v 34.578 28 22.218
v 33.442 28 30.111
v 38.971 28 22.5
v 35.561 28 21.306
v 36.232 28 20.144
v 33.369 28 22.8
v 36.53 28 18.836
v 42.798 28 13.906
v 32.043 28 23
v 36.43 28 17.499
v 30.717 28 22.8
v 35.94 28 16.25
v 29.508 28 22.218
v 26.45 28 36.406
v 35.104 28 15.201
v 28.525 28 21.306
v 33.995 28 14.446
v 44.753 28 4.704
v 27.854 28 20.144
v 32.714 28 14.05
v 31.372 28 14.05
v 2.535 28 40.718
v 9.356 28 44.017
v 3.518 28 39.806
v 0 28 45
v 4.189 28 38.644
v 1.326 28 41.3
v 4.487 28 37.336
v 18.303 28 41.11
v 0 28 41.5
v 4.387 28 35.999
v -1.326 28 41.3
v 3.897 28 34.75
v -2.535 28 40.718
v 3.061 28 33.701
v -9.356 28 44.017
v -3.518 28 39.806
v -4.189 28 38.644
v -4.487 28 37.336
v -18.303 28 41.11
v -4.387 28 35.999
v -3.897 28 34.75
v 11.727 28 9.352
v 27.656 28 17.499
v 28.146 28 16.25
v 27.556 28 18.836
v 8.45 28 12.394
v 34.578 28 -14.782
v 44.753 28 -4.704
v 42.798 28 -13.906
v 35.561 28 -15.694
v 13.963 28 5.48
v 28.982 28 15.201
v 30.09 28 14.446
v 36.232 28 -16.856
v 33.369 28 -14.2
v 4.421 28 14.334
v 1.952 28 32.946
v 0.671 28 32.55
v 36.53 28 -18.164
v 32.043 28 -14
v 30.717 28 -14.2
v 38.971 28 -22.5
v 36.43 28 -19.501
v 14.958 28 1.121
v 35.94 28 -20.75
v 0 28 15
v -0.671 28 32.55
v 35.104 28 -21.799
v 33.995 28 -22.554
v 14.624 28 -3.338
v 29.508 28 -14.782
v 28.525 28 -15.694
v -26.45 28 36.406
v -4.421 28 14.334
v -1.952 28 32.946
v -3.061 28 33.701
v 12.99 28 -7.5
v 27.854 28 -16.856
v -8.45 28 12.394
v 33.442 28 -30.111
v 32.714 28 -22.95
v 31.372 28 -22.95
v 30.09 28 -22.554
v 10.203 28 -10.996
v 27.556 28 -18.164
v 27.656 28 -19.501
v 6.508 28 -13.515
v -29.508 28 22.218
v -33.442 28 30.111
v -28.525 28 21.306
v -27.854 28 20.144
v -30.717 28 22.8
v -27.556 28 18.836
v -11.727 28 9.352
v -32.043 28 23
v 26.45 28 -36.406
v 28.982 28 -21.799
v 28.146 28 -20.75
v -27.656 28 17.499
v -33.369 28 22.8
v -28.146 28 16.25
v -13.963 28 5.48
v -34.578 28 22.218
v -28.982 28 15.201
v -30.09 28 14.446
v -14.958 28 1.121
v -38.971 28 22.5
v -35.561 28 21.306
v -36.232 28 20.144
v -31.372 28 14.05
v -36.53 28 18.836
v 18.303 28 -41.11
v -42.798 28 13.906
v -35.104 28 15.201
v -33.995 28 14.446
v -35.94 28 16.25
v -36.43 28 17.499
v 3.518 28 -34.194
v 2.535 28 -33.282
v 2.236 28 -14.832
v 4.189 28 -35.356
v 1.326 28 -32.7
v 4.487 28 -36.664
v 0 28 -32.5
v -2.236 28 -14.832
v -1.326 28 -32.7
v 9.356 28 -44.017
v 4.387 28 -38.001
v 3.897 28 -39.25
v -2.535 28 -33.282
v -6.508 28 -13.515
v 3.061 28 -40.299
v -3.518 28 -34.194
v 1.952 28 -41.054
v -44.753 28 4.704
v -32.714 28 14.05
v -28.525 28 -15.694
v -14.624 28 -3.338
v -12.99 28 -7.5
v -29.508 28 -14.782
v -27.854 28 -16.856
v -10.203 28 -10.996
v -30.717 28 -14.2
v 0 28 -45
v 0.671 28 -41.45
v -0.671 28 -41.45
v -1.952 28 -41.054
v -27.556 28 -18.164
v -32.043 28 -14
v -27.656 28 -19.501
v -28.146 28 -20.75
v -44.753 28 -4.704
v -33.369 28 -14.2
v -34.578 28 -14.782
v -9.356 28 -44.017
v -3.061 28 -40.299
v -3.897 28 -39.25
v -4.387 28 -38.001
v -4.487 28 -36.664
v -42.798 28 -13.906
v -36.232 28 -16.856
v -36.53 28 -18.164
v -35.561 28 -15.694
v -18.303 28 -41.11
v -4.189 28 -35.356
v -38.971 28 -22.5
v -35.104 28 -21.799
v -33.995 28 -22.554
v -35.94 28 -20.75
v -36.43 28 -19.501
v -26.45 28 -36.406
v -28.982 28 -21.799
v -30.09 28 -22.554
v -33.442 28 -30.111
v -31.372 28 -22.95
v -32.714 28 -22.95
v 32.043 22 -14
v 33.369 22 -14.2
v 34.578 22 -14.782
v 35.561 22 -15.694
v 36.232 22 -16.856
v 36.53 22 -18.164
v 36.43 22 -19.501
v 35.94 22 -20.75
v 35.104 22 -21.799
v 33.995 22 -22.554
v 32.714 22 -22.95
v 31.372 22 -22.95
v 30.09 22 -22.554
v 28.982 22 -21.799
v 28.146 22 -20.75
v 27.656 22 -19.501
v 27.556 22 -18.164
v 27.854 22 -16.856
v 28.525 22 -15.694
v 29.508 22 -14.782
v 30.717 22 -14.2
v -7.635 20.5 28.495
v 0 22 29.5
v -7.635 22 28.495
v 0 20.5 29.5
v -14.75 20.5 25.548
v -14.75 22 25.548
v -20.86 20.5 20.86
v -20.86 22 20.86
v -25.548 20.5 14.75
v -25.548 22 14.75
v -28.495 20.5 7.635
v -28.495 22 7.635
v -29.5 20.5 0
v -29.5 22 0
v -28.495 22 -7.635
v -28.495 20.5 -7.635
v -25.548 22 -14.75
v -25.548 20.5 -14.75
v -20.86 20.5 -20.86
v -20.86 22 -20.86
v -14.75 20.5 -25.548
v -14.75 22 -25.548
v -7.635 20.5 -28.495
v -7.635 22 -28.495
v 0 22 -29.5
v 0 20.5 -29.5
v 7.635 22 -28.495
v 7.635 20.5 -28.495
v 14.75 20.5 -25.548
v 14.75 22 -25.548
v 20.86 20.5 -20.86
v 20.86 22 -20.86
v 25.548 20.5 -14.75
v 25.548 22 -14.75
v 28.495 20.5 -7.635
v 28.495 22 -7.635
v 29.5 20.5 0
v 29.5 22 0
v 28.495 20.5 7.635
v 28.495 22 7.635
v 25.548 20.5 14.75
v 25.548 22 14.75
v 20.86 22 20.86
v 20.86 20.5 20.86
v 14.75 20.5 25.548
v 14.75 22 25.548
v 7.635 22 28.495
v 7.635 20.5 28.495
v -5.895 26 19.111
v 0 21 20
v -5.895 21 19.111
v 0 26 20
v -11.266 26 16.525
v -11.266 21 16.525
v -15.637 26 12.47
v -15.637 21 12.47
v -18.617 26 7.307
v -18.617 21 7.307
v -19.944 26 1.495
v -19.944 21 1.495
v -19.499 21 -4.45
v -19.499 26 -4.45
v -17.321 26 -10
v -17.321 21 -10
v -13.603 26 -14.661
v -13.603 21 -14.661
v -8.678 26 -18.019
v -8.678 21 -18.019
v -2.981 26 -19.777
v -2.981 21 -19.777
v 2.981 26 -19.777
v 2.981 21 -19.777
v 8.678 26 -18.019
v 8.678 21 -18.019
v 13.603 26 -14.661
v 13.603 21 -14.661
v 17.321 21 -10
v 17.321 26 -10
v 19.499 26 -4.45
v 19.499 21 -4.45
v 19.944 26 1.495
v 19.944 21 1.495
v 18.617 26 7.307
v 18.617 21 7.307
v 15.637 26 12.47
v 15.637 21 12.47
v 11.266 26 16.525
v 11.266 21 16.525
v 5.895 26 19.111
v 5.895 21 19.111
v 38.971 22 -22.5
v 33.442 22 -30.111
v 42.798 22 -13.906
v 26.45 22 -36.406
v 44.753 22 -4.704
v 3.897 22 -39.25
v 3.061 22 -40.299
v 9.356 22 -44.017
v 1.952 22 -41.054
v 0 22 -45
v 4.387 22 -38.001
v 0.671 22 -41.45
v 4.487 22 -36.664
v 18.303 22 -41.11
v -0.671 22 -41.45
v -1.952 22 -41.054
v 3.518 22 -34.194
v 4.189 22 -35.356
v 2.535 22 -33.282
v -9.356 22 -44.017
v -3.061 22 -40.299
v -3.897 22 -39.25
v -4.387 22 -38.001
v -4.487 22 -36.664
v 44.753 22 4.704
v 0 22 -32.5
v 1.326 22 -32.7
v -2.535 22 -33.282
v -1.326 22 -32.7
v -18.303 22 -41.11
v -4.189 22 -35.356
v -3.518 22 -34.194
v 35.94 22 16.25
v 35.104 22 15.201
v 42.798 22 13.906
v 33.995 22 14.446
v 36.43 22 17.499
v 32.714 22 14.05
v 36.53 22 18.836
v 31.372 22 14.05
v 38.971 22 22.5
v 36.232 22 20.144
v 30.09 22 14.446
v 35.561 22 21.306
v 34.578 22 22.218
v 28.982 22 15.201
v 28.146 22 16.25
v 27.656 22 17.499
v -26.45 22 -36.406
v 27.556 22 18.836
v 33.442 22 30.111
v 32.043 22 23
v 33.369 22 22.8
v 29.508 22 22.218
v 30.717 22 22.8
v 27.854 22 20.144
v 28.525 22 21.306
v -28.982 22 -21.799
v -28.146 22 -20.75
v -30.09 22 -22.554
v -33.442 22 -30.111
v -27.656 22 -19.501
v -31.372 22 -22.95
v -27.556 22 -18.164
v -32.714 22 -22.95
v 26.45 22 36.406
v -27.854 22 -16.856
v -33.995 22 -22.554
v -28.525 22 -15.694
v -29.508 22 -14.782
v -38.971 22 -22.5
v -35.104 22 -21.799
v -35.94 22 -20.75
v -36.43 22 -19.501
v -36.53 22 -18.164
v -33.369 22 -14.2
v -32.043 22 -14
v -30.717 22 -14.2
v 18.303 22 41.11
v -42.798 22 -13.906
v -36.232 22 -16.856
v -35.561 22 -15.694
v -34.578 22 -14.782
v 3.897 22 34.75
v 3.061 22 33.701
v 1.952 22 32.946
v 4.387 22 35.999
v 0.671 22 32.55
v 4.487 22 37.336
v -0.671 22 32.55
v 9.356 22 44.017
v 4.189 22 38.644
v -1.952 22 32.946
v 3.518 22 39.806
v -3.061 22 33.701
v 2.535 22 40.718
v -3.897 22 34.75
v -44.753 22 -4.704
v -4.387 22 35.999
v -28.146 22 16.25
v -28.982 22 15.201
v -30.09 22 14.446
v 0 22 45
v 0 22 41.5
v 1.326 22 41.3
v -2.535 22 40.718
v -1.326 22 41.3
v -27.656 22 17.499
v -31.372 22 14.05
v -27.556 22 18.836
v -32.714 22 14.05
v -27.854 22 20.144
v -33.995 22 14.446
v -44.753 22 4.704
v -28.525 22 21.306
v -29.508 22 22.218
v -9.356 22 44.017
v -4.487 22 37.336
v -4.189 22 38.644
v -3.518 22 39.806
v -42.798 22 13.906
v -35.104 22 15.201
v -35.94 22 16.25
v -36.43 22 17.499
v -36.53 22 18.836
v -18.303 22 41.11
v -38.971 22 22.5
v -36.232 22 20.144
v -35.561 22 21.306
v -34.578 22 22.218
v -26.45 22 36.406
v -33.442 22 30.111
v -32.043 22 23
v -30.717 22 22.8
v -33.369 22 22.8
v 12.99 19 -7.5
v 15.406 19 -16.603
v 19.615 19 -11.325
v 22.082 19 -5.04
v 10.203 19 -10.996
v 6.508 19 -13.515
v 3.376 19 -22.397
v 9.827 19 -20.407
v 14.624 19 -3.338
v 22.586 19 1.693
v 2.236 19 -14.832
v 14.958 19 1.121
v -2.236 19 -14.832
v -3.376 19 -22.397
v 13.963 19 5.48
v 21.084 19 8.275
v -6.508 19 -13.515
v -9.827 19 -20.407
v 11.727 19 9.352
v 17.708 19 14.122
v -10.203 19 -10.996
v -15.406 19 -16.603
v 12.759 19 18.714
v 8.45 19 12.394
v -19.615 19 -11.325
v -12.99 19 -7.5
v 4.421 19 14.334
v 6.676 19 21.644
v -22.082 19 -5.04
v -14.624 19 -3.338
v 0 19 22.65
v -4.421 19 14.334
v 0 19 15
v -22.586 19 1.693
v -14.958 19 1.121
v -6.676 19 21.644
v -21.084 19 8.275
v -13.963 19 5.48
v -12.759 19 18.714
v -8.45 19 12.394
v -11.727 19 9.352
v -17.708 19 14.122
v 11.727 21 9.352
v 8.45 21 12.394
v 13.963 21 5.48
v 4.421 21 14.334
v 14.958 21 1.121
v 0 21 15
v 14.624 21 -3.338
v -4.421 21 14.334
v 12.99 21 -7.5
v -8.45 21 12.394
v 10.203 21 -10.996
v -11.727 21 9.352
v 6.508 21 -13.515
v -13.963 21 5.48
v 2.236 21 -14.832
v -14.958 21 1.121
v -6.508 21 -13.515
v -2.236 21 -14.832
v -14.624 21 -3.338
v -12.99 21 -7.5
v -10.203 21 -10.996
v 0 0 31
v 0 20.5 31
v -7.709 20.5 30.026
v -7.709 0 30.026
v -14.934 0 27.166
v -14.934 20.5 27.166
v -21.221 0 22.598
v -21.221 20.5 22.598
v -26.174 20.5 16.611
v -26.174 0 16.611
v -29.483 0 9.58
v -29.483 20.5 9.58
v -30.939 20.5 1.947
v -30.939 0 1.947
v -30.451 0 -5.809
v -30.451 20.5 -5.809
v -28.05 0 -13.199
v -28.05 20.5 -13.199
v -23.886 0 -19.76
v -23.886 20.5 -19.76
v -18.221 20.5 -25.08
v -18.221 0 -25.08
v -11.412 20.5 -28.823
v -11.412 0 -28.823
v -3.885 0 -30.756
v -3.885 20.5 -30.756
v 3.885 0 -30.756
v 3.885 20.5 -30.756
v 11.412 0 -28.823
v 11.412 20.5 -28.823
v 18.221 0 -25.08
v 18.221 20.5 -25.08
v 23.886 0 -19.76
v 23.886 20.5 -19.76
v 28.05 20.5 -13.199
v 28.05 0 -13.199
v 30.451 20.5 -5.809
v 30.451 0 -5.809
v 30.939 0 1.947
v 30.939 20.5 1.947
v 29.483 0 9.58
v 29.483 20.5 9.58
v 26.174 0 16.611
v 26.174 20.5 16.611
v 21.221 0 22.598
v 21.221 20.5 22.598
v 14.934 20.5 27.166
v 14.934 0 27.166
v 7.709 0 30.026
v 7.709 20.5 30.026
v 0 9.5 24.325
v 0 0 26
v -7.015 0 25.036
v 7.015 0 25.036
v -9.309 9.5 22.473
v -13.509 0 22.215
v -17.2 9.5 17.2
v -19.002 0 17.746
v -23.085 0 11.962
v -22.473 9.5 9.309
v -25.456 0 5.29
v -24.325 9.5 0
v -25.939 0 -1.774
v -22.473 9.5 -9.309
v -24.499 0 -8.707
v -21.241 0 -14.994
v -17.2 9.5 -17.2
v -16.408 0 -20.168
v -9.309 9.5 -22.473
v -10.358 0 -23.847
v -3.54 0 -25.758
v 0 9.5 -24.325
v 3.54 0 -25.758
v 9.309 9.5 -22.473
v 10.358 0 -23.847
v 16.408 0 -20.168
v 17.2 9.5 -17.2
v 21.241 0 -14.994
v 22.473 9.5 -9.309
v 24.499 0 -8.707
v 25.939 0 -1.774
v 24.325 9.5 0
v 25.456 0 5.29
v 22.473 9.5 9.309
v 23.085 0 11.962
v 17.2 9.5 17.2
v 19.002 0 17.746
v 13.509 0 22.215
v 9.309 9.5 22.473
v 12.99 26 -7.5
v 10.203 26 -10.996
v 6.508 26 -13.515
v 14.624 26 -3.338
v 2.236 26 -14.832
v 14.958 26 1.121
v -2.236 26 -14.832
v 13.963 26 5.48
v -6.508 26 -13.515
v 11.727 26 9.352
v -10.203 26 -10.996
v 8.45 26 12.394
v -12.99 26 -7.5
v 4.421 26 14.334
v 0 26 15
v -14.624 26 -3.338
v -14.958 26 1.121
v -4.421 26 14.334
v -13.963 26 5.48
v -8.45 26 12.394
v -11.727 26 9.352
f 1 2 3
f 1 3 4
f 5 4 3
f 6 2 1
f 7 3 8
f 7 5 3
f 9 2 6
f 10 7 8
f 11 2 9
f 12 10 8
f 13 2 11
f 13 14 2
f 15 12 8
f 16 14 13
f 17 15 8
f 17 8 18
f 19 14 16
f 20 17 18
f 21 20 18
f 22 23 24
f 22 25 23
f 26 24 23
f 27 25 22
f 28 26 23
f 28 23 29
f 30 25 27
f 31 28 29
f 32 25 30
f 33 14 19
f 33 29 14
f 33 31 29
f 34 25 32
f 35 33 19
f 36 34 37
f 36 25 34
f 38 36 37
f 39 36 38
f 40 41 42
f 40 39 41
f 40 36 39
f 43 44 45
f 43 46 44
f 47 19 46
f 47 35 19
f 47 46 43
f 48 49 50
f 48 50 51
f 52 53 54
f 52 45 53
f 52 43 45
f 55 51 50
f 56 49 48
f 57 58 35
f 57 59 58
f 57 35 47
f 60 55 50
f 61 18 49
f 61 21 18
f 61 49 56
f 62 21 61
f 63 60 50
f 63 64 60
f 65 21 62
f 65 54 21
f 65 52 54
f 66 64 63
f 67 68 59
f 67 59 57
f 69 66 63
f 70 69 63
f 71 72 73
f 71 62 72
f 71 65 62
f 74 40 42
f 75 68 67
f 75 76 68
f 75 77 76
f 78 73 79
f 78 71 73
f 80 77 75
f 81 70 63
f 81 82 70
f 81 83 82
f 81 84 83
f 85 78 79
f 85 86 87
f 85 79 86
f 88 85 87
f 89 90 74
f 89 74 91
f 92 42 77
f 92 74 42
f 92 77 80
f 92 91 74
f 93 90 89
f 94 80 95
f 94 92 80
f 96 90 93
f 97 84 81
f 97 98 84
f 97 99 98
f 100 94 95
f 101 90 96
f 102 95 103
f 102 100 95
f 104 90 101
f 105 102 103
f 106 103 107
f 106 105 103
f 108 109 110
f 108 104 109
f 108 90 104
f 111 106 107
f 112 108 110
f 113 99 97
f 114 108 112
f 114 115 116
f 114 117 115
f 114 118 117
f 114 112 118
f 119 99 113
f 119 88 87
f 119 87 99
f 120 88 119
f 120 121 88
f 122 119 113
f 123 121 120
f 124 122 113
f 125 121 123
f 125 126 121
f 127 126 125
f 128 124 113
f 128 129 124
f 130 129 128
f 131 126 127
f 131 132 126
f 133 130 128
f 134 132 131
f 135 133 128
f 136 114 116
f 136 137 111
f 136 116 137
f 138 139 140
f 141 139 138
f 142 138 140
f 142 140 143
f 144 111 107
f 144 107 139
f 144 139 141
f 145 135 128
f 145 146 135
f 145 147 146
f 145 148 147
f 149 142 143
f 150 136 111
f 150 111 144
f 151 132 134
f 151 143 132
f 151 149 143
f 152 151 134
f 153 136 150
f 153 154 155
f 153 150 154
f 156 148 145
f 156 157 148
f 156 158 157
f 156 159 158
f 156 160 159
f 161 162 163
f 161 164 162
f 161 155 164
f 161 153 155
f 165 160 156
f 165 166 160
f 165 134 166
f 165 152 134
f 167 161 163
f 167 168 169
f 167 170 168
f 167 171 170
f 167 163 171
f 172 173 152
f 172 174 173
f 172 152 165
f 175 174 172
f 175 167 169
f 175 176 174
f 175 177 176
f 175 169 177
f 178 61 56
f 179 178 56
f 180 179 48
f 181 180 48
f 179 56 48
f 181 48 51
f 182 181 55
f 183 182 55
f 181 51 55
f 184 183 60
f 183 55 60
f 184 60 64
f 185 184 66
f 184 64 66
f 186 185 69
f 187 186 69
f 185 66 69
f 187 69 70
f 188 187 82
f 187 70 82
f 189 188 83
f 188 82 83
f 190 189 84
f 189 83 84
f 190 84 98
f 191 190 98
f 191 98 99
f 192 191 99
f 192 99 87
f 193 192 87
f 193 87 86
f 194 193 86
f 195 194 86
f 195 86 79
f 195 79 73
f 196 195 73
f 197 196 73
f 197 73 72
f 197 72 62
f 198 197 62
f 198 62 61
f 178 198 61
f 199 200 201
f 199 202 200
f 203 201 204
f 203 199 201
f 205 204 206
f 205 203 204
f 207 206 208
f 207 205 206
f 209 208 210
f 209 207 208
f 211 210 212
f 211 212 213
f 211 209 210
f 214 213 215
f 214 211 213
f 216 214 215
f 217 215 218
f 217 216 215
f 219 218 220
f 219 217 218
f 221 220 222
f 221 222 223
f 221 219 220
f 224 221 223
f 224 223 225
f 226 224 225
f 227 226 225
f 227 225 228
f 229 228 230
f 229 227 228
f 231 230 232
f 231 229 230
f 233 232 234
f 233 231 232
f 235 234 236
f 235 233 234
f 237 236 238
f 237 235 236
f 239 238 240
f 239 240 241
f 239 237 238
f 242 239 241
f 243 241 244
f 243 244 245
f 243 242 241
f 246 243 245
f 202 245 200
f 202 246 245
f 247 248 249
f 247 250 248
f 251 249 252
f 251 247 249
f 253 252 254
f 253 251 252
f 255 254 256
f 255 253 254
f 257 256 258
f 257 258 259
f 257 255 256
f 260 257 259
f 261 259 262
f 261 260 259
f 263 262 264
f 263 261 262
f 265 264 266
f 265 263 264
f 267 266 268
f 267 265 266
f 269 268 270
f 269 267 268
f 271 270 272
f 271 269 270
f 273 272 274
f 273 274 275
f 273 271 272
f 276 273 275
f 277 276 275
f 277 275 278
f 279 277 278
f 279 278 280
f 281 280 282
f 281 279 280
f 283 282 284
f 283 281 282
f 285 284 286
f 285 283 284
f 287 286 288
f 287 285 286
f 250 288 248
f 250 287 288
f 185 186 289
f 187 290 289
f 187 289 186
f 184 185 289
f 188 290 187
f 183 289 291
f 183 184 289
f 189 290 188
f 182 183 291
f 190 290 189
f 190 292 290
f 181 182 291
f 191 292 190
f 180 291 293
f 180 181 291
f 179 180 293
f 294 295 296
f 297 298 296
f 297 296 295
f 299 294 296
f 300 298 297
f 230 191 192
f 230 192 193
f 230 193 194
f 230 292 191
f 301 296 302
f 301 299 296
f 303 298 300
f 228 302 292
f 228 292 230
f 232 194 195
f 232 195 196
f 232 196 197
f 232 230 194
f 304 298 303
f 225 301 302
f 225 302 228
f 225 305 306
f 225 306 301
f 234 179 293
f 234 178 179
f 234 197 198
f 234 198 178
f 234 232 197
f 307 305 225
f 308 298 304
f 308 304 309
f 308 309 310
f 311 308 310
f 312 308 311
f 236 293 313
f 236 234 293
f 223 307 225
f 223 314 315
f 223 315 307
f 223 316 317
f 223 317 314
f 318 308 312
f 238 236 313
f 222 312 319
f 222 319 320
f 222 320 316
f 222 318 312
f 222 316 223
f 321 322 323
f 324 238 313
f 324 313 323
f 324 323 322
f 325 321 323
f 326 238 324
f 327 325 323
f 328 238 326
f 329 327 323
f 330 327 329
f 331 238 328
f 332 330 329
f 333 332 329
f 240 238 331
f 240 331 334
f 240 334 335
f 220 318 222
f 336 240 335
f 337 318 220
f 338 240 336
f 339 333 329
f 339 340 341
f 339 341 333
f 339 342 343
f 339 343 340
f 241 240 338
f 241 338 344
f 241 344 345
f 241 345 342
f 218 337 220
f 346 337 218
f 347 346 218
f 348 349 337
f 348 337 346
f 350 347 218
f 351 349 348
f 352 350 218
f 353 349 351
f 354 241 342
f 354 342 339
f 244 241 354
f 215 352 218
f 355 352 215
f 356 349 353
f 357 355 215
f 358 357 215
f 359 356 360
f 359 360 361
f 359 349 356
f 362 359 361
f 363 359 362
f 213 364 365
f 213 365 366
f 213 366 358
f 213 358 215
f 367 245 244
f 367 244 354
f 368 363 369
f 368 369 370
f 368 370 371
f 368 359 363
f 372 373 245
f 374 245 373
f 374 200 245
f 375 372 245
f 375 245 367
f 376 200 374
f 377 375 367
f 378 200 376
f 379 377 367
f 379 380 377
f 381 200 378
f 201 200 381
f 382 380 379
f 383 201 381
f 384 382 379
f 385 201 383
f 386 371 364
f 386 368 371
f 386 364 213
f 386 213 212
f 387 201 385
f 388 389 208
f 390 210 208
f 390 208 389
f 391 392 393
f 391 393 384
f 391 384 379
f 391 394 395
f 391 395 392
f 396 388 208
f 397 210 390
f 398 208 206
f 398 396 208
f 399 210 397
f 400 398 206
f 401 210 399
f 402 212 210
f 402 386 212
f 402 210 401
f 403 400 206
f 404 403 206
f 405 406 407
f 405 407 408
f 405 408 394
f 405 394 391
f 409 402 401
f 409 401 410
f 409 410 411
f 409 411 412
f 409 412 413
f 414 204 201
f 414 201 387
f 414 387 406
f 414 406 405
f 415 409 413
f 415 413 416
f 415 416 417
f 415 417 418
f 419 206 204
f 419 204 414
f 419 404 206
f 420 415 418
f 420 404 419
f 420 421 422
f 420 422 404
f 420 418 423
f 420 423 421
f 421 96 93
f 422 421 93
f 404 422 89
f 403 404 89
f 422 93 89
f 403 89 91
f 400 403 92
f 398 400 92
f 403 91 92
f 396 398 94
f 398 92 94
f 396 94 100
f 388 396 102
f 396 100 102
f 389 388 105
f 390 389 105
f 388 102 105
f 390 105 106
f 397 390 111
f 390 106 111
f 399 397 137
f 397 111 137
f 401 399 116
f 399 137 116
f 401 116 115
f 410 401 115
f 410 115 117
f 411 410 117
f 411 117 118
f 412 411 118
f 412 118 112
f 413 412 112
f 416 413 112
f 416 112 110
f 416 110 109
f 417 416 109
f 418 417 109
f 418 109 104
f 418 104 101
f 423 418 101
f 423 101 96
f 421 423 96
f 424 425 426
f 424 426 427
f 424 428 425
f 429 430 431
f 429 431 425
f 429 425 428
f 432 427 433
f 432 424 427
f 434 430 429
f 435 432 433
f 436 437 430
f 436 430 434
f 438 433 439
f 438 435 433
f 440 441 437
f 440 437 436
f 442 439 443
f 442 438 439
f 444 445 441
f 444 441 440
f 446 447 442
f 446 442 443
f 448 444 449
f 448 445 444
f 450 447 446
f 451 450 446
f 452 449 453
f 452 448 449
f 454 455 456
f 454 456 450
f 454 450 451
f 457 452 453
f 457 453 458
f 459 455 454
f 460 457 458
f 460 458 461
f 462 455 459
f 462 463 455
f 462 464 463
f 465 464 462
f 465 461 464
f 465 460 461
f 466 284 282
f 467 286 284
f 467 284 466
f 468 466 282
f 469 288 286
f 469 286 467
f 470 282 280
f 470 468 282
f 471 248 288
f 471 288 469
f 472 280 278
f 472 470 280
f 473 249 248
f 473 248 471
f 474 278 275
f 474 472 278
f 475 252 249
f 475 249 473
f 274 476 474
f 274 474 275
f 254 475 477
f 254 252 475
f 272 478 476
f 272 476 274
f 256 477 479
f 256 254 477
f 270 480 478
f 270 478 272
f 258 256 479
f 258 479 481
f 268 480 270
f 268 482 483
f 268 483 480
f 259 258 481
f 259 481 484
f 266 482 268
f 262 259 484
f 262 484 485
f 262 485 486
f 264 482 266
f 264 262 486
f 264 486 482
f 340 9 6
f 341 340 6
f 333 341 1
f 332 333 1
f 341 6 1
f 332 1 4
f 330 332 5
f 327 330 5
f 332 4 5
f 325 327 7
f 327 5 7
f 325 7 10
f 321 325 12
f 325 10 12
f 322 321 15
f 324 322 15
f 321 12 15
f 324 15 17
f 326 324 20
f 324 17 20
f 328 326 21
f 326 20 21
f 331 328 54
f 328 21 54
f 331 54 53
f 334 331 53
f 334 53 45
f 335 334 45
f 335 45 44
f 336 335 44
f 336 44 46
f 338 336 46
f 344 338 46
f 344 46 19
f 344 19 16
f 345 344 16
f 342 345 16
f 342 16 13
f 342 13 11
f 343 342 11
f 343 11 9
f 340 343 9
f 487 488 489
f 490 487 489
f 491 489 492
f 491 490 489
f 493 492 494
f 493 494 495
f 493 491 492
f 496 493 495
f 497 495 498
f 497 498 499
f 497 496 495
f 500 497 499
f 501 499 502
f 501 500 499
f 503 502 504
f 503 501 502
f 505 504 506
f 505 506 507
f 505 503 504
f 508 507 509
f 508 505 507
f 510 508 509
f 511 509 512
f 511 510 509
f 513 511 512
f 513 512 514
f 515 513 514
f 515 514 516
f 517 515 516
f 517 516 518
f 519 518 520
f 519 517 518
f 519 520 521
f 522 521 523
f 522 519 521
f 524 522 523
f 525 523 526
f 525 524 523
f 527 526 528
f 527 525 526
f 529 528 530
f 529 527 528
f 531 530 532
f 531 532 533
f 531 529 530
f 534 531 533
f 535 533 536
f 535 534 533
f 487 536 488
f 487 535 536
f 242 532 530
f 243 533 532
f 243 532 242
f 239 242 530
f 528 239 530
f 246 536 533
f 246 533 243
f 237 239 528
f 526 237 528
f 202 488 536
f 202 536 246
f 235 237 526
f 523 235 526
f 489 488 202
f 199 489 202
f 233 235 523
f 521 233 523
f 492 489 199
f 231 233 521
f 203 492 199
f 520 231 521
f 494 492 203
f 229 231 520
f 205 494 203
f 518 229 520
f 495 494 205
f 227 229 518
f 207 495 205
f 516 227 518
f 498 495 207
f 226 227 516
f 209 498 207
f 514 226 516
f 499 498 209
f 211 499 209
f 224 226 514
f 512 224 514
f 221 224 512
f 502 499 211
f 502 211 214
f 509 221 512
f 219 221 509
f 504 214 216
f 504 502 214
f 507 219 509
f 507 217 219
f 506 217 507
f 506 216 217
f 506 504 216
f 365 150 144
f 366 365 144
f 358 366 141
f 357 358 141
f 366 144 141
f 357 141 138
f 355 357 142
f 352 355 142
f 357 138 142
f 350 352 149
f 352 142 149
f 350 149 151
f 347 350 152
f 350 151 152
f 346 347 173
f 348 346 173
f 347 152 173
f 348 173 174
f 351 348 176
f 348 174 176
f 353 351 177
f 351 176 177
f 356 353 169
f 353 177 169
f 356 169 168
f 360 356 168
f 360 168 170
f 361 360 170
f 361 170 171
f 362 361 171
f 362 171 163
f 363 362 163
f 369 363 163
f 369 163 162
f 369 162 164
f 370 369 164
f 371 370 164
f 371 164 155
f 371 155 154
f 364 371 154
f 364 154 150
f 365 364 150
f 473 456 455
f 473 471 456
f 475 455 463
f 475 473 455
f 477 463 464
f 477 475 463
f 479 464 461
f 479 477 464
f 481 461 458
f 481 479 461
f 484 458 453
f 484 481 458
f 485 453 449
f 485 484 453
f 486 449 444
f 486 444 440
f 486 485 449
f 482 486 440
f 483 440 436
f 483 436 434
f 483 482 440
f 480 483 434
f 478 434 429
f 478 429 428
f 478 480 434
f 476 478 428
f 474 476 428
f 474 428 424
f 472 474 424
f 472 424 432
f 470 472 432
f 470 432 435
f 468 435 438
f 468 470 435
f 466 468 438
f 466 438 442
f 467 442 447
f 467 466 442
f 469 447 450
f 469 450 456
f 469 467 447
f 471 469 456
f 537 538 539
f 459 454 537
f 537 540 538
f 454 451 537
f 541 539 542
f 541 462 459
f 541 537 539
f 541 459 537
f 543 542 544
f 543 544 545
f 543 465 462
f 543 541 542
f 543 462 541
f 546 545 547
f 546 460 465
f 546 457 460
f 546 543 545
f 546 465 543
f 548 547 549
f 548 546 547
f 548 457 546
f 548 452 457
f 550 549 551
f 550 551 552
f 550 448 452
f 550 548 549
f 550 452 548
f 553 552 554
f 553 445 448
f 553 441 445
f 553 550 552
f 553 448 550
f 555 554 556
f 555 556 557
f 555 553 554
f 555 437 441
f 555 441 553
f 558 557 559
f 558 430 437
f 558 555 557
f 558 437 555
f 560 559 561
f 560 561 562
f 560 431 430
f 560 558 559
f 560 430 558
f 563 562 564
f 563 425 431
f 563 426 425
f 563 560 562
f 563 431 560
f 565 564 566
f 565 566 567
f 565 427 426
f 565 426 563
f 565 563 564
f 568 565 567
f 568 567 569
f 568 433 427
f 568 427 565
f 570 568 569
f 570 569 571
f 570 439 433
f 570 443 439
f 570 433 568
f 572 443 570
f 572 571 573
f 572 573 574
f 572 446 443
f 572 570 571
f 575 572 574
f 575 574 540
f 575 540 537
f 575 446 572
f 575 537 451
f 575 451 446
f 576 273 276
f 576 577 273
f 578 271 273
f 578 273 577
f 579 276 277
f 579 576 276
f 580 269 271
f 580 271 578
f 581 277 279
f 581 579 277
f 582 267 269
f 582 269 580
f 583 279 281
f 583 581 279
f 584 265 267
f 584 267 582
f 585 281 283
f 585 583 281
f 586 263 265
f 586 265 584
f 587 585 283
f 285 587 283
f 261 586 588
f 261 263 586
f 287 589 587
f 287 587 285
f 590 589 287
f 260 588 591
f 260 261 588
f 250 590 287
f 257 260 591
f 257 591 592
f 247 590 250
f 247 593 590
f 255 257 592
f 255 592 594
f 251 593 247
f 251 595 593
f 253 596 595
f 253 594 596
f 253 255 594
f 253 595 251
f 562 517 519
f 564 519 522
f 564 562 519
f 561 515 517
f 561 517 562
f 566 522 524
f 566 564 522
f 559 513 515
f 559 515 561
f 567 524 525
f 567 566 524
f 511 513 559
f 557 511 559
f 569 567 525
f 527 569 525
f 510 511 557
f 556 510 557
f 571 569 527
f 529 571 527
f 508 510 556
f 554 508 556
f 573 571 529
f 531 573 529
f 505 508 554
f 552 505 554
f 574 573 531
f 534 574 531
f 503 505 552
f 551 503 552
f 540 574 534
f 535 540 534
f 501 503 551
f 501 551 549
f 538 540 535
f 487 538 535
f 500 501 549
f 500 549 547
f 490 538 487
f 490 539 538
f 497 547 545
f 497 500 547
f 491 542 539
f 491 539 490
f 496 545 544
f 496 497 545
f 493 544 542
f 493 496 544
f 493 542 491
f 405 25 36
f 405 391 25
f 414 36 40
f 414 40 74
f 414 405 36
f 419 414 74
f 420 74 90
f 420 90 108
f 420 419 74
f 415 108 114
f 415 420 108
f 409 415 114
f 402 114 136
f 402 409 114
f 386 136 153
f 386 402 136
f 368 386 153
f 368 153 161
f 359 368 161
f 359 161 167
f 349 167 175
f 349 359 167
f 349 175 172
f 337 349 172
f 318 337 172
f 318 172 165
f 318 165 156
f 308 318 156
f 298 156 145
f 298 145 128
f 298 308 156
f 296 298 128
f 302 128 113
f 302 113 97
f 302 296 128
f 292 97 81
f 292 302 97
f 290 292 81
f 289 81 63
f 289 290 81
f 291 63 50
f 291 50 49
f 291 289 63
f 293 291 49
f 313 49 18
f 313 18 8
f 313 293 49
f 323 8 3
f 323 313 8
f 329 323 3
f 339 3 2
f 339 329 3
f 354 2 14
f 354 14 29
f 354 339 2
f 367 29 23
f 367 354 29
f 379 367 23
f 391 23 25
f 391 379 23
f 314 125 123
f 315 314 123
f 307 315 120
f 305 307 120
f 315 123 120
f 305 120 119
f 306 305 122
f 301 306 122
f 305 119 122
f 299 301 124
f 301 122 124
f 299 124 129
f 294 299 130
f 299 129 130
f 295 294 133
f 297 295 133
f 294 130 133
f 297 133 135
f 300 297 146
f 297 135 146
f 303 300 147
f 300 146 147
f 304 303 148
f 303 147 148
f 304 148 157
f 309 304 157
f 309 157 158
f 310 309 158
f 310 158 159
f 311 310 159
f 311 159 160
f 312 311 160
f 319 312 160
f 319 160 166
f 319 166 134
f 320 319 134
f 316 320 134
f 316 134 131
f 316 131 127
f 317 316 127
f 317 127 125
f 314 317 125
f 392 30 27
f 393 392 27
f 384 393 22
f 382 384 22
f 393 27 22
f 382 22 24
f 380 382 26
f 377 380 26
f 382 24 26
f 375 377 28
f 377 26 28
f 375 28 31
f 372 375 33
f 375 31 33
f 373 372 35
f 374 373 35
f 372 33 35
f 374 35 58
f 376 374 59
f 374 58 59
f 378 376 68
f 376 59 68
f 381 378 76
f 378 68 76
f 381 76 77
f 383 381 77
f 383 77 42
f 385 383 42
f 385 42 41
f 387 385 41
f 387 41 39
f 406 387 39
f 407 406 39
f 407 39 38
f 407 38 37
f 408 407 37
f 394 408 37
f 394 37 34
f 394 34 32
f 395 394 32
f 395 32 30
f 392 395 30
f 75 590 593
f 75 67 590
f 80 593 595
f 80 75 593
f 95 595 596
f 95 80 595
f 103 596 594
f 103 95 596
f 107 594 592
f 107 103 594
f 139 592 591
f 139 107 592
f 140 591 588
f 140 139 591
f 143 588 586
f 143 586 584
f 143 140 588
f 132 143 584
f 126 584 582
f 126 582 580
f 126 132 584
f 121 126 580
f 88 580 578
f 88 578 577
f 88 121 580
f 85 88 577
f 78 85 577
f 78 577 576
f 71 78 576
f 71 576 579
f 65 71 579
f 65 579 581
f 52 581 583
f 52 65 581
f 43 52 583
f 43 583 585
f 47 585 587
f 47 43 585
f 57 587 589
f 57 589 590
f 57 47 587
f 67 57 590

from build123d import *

# Parameters (mm, degrees)
CUT_EXTRUDE1_REACH = 71.527
SKETCH2_R          = 4.5


with BuildPart() as part:
    # Sketch1 → Revolve1 (revolve)
    with BuildSketch(Plane.XY, mode=Mode.PRIVATE) as revolve1_sk:
        Polygon((-45, 28), (-45, 22), (-29.5, 22), (-29.5, 20.5), (-31, 20.5), (-31, 0), (-26, 0), (-22.649787367, 19), (-15, 19), (-15, 21), (-20, 21), (-20, 26), (-15, 26), (-15, 28), (-29, 28), align=None)
    revolve(revolve1_sk.sketch.rotate(Axis((0, 30.618797564, 0), (0, -1, 0)), 270), axis=Axis((0, 30.618797564, 0), (0, -1, 0)))

    # Sketch2 → Cut-Extrude1 (cut, up to next)
    with BuildSketch(Plane(origin=(0, 28, 0), x_dir=(1, 0, 0), z_dir=(0, 1, 0)), mode=Mode.PRIVATE) as cut_extrude1_sk1:
        with Locations(Location((0, 37, 0), (0, 0, 270))):
            Circle(SKETCH2_R)
    cut_extrude1_tool1 = extrude(cut_extrude1_sk1.sketch, amount=-CUT_EXTRUDE1_REACH, mode=Mode.PRIVATE) & part.part
    # Sketch2 → Cut-Extrude1 (cut, up to next)
    with BuildSketch(Plane(origin=(0, 28, 0), x_dir=(1, 0, 0), z_dir=(0, 1, 0)), mode=Mode.PRIVATE) as cut_extrude1_sk2:
        with Locations(Location((32.04293994, 18.5, 0), (0, 0, 270))):
            Circle(SKETCH2_R)
    cut_extrude1_tool2 = extrude(cut_extrude1_sk2.sketch, amount=-CUT_EXTRUDE1_REACH, mode=Mode.PRIVATE) & part.part
    # Sketch2 → Cut-Extrude1 (cut, up to next)
    with BuildSketch(Plane(origin=(0, 28, 0), x_dir=(1, 0, 0), z_dir=(0, 1, 0)), mode=Mode.PRIVATE) as cut_extrude1_sk3:
        with Locations(Location((32.04293994, -18.5, 0), (0, 0, 270))):
            Circle(SKETCH2_R)
    cut_extrude1_tool3 = extrude(cut_extrude1_sk3.sketch, amount=-CUT_EXTRUDE1_REACH, mode=Mode.PRIVATE) & part.part
    # Sketch2 → Cut-Extrude1 (cut, up to next)
    with BuildSketch(Plane(origin=(0, 28, 0), x_dir=(1, 0, 0), z_dir=(0, 1, 0)), mode=Mode.PRIVATE) as cut_extrude1_sk4:
        with Locations(Location((0, -37, 0), (0, 0, 270))):
            Circle(SKETCH2_R)
    cut_extrude1_tool4 = extrude(cut_extrude1_sk4.sketch, amount=-CUT_EXTRUDE1_REACH, mode=Mode.PRIVATE) & part.part
    # Sketch2 → Cut-Extrude1 (cut, up to next)
    with BuildSketch(Plane(origin=(0, 28, 0), x_dir=(1, 0, 0), z_dir=(0, 1, 0)), mode=Mode.PRIVATE) as cut_extrude1_sk5:
        with Locations(Location((-32.04293994, -18.5, 0), (0, 0, 270))):
            Circle(SKETCH2_R)
    cut_extrude1_tool5 = extrude(cut_extrude1_sk5.sketch, amount=-CUT_EXTRUDE1_REACH, mode=Mode.PRIVATE) & part.part
    # Sketch2 → Cut-Extrude1 (cut, up to next)
    with BuildSketch(Plane(origin=(0, 28, 0), x_dir=(1, 0, 0), z_dir=(0, 1, 0)), mode=Mode.PRIVATE) as cut_extrude1_sk6:
        with Locations(Location((-32.04293994, 18.5, 0), (0, 0, 270))):
            Circle(SKETCH2_R)
    cut_extrude1_tool6 = extrude(cut_extrude1_sk6.sketch, amount=-CUT_EXTRUDE1_REACH, mode=Mode.PRIVATE) & part.part
    add(cut_extrude1_tool1.solids().sort_by_distance((0, 28, -37))[0], mode=Mode.SUBTRACT)
    add(cut_extrude1_tool2.solids().sort_by_distance((32.04294, 28, -18.5))[0], mode=Mode.SUBTRACT)
    add(cut_extrude1_tool3.solids().sort_by_distance((32.04294, 28, 18.5))[0], mode=Mode.SUBTRACT)
    add(cut_extrude1_tool4.solids().sort_by_distance((0, 28, 37))[0], mode=Mode.SUBTRACT)
    add(cut_extrude1_tool5.solids().sort_by_distance((-32.04294, 28, 18.5))[0], mode=Mode.SUBTRACT)
    add(cut_extrude1_tool6.solids().sort_by_distance((-32.04294, 28, -18.5))[0], mode=Mode.SUBTRACT)


solid = part.part
